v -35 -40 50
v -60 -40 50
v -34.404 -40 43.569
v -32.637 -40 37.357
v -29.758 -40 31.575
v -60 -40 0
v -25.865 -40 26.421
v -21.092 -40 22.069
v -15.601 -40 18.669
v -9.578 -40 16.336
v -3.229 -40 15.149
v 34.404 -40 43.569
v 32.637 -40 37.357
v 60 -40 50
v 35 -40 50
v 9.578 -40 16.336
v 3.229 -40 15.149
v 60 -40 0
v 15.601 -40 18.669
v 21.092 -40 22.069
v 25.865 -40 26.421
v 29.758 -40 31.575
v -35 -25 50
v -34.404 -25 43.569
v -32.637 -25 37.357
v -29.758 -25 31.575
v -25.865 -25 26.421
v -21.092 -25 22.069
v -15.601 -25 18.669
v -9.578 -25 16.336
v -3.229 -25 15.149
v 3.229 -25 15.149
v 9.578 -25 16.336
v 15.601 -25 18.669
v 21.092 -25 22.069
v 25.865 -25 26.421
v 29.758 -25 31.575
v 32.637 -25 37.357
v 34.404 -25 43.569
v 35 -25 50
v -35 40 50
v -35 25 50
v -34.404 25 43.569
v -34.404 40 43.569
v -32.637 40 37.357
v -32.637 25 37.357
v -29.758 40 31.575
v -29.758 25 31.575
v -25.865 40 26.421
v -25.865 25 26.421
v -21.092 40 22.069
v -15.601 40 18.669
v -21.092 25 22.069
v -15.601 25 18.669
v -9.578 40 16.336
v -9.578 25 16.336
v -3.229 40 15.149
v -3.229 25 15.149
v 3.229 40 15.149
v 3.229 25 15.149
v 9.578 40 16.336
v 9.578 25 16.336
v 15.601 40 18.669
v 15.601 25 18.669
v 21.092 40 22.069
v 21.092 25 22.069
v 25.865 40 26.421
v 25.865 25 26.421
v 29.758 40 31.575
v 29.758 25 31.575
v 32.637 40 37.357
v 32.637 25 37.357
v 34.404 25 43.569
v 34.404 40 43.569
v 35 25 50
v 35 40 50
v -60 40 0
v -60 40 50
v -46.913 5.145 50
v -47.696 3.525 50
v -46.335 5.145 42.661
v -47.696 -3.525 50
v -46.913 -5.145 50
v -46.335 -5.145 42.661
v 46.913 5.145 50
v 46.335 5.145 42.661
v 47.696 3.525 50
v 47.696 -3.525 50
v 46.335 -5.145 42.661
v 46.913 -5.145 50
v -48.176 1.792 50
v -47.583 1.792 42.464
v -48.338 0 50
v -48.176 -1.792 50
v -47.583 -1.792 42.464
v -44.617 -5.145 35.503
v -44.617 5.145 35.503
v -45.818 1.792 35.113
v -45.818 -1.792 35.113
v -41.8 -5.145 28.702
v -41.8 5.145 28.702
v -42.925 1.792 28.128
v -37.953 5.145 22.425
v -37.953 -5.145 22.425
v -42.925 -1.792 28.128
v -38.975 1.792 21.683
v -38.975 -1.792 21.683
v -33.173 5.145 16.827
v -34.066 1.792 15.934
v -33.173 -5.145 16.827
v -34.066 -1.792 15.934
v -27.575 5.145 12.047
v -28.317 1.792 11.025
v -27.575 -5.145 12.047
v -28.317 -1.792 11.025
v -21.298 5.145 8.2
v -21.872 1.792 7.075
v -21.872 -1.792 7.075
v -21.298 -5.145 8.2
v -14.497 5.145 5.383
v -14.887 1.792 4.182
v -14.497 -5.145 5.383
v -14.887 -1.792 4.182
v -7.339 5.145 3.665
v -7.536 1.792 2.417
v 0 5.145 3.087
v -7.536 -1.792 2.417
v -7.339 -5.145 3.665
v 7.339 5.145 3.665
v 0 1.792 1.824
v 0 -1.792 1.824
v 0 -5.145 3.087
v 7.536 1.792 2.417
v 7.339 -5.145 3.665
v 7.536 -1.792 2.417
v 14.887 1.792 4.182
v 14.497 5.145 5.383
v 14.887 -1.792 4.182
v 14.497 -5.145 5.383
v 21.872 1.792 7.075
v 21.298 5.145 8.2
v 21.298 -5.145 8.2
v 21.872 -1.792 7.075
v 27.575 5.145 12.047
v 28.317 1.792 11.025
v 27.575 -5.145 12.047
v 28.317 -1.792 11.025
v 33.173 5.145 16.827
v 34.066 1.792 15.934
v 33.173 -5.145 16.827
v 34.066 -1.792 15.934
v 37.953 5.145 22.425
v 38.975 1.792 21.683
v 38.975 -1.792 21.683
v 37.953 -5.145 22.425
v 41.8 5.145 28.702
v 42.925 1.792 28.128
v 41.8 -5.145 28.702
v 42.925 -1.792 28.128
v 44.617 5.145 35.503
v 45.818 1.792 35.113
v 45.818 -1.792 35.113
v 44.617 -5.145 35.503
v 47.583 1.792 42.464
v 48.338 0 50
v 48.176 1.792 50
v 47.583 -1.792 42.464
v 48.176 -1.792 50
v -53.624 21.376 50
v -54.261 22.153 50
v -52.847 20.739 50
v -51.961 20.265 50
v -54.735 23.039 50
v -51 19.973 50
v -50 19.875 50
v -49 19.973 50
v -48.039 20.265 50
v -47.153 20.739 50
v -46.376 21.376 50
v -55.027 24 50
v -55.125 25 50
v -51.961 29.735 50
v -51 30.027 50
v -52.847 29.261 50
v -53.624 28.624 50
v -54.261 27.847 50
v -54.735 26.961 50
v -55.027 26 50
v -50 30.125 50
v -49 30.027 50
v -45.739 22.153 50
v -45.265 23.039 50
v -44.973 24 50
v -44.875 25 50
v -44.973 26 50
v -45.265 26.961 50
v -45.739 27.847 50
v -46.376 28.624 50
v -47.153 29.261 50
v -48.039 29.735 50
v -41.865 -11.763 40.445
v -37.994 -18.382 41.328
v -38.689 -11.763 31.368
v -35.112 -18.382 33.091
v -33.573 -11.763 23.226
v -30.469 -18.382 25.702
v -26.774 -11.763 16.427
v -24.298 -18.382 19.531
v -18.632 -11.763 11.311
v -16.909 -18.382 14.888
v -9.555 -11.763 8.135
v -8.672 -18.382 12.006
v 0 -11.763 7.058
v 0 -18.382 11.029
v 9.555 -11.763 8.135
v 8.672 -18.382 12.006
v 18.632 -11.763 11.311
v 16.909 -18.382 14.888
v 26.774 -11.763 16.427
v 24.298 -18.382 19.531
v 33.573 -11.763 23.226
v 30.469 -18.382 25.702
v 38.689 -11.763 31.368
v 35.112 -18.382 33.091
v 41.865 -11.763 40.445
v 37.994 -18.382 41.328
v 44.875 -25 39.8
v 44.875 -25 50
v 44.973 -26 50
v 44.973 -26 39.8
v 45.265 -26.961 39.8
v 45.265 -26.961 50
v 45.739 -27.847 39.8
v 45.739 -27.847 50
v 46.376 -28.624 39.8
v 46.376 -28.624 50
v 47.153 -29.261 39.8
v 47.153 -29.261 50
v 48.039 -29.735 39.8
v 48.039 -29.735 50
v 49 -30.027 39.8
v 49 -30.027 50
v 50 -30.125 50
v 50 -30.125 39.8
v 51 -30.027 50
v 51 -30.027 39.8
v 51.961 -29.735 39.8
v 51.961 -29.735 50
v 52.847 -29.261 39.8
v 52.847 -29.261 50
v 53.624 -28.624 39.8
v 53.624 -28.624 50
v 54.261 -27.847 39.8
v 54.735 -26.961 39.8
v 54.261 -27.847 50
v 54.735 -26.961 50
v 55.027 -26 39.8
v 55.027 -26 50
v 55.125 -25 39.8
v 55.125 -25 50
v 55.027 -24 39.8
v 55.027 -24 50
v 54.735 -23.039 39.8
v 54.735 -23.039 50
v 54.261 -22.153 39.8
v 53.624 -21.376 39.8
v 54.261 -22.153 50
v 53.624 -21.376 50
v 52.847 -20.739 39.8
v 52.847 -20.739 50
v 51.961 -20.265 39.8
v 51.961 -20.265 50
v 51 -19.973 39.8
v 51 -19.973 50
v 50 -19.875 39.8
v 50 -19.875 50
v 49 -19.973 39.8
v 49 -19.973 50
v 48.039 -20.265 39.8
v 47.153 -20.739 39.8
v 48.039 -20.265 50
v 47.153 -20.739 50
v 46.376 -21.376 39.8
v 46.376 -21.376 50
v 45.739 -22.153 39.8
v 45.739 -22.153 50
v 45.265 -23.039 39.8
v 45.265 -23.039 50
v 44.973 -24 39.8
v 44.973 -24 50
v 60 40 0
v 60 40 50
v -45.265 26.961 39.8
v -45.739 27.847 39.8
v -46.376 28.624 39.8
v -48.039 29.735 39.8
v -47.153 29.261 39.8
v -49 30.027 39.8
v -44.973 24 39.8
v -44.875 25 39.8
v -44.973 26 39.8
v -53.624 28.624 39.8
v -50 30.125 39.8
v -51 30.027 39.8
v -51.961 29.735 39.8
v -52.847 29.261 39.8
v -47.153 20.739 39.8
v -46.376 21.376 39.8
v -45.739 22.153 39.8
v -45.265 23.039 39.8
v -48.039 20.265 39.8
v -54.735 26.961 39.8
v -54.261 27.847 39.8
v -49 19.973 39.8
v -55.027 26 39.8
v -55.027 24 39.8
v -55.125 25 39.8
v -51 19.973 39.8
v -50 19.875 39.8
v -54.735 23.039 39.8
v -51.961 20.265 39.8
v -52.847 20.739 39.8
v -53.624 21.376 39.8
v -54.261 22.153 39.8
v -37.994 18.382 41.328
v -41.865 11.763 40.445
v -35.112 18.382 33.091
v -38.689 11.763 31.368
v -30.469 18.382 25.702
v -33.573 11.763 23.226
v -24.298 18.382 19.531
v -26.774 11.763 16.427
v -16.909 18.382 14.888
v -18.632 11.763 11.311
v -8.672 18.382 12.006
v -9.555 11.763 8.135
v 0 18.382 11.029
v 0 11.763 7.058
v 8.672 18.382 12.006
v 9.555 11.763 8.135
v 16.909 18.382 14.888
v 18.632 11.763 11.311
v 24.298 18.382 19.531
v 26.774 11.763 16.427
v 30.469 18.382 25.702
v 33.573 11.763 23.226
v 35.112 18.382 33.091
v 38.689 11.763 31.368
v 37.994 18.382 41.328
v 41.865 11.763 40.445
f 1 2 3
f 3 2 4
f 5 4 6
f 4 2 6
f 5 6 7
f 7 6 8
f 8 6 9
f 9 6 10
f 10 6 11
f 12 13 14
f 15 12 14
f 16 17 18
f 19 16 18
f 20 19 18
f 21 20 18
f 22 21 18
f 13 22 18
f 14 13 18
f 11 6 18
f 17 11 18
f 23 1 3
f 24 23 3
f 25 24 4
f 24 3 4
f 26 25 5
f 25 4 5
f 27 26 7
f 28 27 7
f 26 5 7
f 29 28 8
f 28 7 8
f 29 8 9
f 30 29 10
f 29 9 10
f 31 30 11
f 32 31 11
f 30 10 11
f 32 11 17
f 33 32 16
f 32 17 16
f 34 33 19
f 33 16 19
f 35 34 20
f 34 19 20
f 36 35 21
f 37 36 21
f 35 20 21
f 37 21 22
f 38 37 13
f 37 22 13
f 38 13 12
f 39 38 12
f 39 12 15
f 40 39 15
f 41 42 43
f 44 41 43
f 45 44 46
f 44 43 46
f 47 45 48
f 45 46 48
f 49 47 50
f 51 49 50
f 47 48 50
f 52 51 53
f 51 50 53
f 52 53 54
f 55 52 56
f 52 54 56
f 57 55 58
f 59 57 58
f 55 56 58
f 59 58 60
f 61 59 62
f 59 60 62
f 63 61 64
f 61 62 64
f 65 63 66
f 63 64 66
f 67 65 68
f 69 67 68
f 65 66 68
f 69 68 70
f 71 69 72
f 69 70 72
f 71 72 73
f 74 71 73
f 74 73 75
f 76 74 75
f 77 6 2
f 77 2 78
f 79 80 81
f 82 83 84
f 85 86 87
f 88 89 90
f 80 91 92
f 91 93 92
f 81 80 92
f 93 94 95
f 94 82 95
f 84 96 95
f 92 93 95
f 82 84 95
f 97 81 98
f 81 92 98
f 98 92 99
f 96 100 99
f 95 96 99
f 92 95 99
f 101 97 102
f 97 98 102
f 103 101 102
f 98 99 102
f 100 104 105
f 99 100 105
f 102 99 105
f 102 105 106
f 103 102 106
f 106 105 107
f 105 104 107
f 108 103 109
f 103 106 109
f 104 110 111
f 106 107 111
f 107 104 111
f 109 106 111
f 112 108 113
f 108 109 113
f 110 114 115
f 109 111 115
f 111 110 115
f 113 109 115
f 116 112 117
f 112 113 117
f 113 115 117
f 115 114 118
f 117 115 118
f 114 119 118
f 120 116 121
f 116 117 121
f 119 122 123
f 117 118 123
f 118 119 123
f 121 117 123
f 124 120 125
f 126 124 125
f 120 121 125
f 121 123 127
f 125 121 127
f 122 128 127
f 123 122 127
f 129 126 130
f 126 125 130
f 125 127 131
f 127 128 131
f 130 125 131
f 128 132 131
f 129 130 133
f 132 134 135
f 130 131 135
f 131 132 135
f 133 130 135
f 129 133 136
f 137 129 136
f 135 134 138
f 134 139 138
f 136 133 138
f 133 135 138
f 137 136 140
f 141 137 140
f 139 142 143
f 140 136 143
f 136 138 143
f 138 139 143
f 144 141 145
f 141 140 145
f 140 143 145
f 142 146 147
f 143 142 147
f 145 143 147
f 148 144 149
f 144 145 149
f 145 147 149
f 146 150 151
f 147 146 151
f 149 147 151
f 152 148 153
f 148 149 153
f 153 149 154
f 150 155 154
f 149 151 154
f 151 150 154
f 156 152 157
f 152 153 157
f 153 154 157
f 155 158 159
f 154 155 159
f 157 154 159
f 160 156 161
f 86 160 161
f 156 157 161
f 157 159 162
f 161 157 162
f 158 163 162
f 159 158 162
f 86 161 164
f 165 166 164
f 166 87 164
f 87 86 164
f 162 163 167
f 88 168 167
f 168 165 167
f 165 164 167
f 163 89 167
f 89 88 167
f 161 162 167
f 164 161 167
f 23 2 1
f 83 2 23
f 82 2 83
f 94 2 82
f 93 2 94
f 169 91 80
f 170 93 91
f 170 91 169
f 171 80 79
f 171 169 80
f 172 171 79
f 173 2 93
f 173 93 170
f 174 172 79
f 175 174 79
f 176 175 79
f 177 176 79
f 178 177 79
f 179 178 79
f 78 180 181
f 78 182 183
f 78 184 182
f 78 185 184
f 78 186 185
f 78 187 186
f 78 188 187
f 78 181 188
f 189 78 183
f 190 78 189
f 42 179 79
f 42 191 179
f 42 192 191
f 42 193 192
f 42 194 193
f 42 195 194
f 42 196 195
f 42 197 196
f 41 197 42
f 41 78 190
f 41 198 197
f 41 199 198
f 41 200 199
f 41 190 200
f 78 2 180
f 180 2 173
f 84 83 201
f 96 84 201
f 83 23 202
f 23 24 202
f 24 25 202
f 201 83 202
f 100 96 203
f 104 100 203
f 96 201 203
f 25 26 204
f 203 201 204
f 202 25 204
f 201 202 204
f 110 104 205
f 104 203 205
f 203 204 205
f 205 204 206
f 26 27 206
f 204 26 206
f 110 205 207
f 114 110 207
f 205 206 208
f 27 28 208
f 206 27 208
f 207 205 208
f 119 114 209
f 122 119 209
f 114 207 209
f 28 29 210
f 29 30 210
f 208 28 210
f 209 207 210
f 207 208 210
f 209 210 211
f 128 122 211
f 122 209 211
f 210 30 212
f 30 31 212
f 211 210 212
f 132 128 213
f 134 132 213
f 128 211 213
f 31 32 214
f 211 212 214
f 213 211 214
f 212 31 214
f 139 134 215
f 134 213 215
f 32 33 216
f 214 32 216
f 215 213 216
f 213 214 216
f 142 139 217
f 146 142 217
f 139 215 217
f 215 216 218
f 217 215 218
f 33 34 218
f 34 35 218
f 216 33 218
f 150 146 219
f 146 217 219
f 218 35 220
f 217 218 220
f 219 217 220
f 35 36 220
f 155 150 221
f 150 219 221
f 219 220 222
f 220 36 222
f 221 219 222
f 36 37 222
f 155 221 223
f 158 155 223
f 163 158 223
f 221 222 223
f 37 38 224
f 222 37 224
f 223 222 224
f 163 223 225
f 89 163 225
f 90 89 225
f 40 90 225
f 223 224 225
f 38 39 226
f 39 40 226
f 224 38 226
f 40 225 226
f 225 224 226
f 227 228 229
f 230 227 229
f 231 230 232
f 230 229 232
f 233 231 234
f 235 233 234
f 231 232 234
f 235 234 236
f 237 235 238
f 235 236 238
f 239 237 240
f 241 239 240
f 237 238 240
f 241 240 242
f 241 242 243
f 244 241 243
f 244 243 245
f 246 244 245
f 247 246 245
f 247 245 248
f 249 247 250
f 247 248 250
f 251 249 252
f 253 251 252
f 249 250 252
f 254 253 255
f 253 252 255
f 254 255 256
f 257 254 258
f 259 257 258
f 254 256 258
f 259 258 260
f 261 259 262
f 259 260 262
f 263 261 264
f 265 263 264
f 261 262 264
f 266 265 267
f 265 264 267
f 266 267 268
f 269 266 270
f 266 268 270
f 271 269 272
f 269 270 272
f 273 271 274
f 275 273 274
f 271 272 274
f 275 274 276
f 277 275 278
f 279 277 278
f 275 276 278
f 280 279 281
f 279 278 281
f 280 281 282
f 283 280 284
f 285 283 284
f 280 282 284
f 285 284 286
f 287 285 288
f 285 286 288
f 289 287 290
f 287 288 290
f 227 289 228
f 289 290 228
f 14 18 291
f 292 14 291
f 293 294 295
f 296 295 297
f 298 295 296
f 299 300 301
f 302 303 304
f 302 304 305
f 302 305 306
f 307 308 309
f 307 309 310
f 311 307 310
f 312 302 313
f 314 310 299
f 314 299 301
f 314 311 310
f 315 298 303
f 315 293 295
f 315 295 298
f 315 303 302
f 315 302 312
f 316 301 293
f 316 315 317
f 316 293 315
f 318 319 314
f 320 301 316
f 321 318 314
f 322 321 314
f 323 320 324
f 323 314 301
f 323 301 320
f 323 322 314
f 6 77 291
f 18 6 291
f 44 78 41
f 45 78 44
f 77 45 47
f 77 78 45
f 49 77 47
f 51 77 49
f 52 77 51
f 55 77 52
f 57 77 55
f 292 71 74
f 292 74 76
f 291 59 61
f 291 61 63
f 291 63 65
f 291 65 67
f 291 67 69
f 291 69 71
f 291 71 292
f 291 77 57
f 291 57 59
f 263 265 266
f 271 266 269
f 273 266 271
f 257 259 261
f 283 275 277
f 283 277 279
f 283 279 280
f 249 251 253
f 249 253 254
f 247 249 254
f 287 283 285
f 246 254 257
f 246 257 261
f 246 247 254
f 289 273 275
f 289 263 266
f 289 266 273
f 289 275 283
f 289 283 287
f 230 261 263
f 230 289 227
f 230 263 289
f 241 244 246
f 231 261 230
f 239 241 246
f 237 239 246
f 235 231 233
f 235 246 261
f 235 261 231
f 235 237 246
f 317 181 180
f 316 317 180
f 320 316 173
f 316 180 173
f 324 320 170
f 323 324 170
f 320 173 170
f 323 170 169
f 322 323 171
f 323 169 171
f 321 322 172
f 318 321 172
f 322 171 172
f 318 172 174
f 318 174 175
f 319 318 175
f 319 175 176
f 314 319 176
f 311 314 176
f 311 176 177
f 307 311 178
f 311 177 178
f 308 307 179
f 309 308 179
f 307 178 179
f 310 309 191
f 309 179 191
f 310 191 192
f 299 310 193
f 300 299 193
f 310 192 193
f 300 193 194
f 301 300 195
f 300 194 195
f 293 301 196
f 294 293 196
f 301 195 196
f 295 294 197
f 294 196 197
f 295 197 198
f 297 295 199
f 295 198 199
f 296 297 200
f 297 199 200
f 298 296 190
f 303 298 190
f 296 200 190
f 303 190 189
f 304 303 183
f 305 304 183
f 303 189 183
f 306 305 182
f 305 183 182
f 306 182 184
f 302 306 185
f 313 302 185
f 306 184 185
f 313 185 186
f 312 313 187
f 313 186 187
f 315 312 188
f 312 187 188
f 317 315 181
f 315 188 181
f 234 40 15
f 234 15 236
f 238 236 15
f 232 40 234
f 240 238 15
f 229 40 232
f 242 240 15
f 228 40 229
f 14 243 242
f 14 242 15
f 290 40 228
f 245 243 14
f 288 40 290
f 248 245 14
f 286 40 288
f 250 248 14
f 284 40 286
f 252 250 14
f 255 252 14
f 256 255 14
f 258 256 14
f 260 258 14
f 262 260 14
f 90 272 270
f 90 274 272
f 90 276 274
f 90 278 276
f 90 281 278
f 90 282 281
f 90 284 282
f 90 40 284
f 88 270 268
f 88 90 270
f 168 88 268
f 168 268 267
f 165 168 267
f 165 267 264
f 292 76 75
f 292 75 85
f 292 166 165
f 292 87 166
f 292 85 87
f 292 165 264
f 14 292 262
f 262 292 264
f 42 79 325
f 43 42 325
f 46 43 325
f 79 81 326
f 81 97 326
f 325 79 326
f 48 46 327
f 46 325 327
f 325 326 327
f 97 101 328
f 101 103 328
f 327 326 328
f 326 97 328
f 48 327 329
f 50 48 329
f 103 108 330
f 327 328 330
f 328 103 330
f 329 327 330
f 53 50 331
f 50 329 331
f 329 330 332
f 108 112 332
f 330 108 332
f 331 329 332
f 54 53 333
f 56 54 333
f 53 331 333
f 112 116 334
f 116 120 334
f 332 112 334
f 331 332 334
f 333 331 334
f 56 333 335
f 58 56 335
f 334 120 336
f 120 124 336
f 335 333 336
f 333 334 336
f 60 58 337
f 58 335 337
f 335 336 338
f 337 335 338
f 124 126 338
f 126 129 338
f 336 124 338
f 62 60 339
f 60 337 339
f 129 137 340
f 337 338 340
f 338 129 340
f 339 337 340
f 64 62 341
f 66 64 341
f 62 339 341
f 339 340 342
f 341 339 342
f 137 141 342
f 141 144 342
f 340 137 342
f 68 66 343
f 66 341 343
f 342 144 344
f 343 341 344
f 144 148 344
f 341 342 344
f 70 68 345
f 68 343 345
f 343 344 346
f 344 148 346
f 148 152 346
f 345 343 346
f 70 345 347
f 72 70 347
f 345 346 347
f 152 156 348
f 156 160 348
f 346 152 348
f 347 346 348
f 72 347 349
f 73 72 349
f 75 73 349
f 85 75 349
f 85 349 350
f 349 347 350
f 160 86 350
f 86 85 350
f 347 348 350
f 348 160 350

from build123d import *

# Parameters (mm, degrees)
SKETCH1_W           = 120
SKETCH1_H           = 80
BOSS_EXTRUDE1_DEPTH = 50
SKETCH3_R           = 5.125
CUT_EXTRUDE1_DEPTH  = 10.2


with BuildPart() as part:
    # Sketch1 → Boss-Extrude1 (new body)
    with BuildSketch(Plane.XY):
        Rectangle(SKETCH1_W, SKETCH1_H)
    extrude(amount=BOSS_EXTRUDE1_DEPTH)

    # Sketch3 → Cut-Extrude1 (cut)
    with BuildSketch(Plane.XY.offset(50)):
        with Locations(Location((-50, 25, 0), (0, 0, 180))):
            Circle(SKETCH3_R)
        with Locations(Location((50, -25, 0), (0, 0, 180))):
            Circle(SKETCH3_R)
    extrude(amount=-CUT_EXTRUDE1_DEPTH, mode=Mode.SUBTRACT)

    # Sketch2 → Cut-Revolve1 (revolve, cut)
    with BuildSketch(Plane.XY.offset(50)):
        with BuildLine():
            Line((-35, 40), (-35, 25))
            Line((-35, 25), (-46.913025467, 5.144957554))
            ThreePointArc((-46.913025467, 5.144957554), (-48.33809621, 0), (-46.913025467, -5.144957554))
            Line((-46.913025467, -5.144957554), (-35, -25))
            Line((-35, -25), (-35, -40))
            Line((-35, -40), (0, -40))
            Line((0, -40), (0, 40))
            Line((0, 40), (-35, 40))
        make_face()
    revolve(axis=Axis((0, 40, 50), (0, -1, 0)), mode=Mode.SUBTRACT)


solid = part.part
